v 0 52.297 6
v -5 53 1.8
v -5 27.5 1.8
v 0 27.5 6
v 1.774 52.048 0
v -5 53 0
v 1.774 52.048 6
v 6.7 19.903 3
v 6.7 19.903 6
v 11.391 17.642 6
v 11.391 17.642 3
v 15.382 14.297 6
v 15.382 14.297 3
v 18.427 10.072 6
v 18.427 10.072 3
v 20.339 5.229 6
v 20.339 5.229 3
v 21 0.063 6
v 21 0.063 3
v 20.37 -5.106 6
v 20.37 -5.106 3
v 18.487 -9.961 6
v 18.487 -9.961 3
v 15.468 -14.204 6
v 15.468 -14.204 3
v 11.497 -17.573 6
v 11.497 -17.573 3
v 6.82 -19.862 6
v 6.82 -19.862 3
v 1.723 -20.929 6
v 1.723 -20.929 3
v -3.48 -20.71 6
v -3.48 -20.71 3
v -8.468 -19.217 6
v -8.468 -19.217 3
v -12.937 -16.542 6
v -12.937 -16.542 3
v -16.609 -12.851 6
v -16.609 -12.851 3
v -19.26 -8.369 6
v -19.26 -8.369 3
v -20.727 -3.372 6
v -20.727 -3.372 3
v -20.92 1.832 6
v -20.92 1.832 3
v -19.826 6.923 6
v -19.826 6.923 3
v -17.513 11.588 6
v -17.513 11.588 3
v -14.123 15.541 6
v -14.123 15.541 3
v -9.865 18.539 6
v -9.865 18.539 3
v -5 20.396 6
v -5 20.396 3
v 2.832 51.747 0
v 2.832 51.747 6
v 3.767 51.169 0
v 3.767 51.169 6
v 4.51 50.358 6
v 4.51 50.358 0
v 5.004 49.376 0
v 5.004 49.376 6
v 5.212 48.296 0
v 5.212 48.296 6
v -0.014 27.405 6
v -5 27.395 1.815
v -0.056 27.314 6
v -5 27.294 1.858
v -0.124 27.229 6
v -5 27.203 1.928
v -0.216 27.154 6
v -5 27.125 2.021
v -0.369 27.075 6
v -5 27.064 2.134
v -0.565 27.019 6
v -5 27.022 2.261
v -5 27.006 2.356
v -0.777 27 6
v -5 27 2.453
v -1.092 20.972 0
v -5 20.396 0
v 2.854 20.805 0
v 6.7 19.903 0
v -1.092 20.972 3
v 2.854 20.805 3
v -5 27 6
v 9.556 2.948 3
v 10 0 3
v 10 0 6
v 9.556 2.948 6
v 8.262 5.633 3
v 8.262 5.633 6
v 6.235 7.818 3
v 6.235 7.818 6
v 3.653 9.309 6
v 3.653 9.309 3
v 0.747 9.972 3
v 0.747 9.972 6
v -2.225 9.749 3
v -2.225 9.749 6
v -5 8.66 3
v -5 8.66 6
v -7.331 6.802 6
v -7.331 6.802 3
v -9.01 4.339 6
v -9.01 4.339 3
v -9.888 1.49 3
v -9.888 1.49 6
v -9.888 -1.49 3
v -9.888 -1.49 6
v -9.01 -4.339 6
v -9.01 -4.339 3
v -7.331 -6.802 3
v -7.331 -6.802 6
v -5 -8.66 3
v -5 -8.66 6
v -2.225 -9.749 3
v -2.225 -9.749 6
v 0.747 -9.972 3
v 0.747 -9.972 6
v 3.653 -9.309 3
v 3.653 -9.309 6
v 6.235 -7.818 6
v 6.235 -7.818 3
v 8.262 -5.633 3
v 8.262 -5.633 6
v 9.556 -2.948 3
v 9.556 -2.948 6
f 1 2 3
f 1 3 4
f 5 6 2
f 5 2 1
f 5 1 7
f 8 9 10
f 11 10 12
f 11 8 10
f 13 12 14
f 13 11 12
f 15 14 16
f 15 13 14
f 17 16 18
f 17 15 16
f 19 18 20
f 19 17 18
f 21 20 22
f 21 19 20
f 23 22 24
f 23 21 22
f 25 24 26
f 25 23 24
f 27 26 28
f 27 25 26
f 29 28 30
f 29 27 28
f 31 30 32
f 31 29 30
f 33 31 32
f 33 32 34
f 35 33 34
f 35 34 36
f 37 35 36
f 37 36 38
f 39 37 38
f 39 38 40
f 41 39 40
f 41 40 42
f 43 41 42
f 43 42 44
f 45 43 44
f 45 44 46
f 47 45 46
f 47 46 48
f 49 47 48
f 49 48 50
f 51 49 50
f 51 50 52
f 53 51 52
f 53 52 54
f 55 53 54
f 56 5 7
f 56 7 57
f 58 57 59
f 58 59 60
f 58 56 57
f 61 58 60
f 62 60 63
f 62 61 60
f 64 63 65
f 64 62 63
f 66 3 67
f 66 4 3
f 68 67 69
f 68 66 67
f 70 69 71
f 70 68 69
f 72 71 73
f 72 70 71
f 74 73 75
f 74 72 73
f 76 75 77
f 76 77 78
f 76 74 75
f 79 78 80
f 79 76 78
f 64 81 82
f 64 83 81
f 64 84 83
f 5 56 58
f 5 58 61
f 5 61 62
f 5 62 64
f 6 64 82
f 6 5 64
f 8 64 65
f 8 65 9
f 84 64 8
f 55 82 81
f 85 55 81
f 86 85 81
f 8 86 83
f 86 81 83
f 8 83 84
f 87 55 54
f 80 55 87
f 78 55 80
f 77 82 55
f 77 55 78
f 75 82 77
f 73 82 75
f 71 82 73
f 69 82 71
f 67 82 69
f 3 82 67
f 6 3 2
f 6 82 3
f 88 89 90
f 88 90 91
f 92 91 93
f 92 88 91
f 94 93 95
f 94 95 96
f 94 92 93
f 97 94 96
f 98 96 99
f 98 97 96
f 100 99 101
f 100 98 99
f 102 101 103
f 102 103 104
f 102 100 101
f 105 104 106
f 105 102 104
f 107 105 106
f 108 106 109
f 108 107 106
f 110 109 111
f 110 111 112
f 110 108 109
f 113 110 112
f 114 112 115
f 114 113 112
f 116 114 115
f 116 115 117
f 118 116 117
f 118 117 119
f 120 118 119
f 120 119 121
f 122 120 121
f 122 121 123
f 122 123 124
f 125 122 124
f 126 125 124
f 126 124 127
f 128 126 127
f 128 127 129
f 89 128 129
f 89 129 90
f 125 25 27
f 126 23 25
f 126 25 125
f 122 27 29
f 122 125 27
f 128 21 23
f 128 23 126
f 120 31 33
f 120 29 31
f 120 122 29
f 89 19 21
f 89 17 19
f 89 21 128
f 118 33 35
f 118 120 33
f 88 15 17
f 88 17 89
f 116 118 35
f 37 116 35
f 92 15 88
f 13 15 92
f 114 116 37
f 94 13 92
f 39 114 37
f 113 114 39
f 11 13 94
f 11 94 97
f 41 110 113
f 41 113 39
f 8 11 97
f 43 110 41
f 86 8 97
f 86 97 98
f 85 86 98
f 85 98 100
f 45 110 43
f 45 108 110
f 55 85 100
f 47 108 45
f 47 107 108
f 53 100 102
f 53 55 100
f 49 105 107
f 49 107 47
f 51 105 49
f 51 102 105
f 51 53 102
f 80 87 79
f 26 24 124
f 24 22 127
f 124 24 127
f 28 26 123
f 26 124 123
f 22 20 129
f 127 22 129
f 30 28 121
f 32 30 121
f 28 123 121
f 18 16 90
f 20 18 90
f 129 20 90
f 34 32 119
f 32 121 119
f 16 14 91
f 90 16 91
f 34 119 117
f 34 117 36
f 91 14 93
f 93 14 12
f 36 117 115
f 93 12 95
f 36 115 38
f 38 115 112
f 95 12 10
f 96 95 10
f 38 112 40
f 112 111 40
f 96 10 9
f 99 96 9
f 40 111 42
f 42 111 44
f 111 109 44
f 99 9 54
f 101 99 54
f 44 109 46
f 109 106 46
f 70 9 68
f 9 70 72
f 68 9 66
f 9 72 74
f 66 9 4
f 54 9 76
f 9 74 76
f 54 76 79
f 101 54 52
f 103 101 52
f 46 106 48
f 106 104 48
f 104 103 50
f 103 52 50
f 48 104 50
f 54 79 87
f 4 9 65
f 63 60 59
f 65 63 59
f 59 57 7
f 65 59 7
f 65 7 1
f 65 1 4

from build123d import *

# Parameters (mm, degrees)
CROQUIS1_R              = 10
SALIENTE_EXTRUIR1_DEPTH = 6
CROQUIS2_R              = 21
CROQUIS2_R_2            = 10
CORTAR_EXTRUIR1_DEPTH   = 3
CORTAR_EXTRUIR2_DEPTH   = 26
REDONDEO1_R             = 0.5


with BuildPart() as part:
    # Croquis1 → Saliente-Extruir1 (new body)
    with BuildSketch(Plane.XY):
        with BuildLine():
            Line((-5, 20.396078054), (-5, 53))
            Line((-5, 53), (1.774122543, 52.047959163))
            ThreePointArc((1.774122543, 52.047959163), (4.166539486, 50.789247719), (5.211948278, 48.296230713))
            Line((5.211948278, 48.296230713), (6.7, 19.902512404))
            ThreePointArc((6.7, 19.902512404), (-0.88509986, -20.981339286), (-5, 20.396078054))
        make_face()
        Circle(CROQUIS1_R, mode=Mode.SUBTRACT)
    extrude(amount=SALIENTE_EXTRUIR1_DEPTH)

    # Croquis2 → Cortar-Extruir1 (cut)
    with BuildSketch(Plane(origin=(0, 0, 0), x_dir=(-1, 0, 0), z_dir=(0, 0, -1))):
        Circle(CROQUIS2_R)
        Circle(CROQUIS2_R_2, mode=Mode.SUBTRACT)
    extrude(amount=-CORTAR_EXTRUIR1_DEPTH, mode=Mode.SUBTRACT)

    # Croquis3 → Cortar-Extruir2 (cut)
    with BuildSketch(Plane(origin=(0, 53, 0), x_dir=(-1, 0, 0), z_dir=(0, 1, 0))):
        Polygon((5, 6), (5, 1.8), (0, 6), align=None)
    extrude(amount=-CORTAR_EXTRUIR2_DEPTH, mode=Mode.SUBTRACT)

    # Redondeo1
    redondeo1_edges = [part.edges().sort_by_distance(p)[0] for p in [
        (-2.5, 27, 3.9),
    ]]
    fillet(redondeo1_edges, radius=REDONDEO1_R)


solid = part.part
